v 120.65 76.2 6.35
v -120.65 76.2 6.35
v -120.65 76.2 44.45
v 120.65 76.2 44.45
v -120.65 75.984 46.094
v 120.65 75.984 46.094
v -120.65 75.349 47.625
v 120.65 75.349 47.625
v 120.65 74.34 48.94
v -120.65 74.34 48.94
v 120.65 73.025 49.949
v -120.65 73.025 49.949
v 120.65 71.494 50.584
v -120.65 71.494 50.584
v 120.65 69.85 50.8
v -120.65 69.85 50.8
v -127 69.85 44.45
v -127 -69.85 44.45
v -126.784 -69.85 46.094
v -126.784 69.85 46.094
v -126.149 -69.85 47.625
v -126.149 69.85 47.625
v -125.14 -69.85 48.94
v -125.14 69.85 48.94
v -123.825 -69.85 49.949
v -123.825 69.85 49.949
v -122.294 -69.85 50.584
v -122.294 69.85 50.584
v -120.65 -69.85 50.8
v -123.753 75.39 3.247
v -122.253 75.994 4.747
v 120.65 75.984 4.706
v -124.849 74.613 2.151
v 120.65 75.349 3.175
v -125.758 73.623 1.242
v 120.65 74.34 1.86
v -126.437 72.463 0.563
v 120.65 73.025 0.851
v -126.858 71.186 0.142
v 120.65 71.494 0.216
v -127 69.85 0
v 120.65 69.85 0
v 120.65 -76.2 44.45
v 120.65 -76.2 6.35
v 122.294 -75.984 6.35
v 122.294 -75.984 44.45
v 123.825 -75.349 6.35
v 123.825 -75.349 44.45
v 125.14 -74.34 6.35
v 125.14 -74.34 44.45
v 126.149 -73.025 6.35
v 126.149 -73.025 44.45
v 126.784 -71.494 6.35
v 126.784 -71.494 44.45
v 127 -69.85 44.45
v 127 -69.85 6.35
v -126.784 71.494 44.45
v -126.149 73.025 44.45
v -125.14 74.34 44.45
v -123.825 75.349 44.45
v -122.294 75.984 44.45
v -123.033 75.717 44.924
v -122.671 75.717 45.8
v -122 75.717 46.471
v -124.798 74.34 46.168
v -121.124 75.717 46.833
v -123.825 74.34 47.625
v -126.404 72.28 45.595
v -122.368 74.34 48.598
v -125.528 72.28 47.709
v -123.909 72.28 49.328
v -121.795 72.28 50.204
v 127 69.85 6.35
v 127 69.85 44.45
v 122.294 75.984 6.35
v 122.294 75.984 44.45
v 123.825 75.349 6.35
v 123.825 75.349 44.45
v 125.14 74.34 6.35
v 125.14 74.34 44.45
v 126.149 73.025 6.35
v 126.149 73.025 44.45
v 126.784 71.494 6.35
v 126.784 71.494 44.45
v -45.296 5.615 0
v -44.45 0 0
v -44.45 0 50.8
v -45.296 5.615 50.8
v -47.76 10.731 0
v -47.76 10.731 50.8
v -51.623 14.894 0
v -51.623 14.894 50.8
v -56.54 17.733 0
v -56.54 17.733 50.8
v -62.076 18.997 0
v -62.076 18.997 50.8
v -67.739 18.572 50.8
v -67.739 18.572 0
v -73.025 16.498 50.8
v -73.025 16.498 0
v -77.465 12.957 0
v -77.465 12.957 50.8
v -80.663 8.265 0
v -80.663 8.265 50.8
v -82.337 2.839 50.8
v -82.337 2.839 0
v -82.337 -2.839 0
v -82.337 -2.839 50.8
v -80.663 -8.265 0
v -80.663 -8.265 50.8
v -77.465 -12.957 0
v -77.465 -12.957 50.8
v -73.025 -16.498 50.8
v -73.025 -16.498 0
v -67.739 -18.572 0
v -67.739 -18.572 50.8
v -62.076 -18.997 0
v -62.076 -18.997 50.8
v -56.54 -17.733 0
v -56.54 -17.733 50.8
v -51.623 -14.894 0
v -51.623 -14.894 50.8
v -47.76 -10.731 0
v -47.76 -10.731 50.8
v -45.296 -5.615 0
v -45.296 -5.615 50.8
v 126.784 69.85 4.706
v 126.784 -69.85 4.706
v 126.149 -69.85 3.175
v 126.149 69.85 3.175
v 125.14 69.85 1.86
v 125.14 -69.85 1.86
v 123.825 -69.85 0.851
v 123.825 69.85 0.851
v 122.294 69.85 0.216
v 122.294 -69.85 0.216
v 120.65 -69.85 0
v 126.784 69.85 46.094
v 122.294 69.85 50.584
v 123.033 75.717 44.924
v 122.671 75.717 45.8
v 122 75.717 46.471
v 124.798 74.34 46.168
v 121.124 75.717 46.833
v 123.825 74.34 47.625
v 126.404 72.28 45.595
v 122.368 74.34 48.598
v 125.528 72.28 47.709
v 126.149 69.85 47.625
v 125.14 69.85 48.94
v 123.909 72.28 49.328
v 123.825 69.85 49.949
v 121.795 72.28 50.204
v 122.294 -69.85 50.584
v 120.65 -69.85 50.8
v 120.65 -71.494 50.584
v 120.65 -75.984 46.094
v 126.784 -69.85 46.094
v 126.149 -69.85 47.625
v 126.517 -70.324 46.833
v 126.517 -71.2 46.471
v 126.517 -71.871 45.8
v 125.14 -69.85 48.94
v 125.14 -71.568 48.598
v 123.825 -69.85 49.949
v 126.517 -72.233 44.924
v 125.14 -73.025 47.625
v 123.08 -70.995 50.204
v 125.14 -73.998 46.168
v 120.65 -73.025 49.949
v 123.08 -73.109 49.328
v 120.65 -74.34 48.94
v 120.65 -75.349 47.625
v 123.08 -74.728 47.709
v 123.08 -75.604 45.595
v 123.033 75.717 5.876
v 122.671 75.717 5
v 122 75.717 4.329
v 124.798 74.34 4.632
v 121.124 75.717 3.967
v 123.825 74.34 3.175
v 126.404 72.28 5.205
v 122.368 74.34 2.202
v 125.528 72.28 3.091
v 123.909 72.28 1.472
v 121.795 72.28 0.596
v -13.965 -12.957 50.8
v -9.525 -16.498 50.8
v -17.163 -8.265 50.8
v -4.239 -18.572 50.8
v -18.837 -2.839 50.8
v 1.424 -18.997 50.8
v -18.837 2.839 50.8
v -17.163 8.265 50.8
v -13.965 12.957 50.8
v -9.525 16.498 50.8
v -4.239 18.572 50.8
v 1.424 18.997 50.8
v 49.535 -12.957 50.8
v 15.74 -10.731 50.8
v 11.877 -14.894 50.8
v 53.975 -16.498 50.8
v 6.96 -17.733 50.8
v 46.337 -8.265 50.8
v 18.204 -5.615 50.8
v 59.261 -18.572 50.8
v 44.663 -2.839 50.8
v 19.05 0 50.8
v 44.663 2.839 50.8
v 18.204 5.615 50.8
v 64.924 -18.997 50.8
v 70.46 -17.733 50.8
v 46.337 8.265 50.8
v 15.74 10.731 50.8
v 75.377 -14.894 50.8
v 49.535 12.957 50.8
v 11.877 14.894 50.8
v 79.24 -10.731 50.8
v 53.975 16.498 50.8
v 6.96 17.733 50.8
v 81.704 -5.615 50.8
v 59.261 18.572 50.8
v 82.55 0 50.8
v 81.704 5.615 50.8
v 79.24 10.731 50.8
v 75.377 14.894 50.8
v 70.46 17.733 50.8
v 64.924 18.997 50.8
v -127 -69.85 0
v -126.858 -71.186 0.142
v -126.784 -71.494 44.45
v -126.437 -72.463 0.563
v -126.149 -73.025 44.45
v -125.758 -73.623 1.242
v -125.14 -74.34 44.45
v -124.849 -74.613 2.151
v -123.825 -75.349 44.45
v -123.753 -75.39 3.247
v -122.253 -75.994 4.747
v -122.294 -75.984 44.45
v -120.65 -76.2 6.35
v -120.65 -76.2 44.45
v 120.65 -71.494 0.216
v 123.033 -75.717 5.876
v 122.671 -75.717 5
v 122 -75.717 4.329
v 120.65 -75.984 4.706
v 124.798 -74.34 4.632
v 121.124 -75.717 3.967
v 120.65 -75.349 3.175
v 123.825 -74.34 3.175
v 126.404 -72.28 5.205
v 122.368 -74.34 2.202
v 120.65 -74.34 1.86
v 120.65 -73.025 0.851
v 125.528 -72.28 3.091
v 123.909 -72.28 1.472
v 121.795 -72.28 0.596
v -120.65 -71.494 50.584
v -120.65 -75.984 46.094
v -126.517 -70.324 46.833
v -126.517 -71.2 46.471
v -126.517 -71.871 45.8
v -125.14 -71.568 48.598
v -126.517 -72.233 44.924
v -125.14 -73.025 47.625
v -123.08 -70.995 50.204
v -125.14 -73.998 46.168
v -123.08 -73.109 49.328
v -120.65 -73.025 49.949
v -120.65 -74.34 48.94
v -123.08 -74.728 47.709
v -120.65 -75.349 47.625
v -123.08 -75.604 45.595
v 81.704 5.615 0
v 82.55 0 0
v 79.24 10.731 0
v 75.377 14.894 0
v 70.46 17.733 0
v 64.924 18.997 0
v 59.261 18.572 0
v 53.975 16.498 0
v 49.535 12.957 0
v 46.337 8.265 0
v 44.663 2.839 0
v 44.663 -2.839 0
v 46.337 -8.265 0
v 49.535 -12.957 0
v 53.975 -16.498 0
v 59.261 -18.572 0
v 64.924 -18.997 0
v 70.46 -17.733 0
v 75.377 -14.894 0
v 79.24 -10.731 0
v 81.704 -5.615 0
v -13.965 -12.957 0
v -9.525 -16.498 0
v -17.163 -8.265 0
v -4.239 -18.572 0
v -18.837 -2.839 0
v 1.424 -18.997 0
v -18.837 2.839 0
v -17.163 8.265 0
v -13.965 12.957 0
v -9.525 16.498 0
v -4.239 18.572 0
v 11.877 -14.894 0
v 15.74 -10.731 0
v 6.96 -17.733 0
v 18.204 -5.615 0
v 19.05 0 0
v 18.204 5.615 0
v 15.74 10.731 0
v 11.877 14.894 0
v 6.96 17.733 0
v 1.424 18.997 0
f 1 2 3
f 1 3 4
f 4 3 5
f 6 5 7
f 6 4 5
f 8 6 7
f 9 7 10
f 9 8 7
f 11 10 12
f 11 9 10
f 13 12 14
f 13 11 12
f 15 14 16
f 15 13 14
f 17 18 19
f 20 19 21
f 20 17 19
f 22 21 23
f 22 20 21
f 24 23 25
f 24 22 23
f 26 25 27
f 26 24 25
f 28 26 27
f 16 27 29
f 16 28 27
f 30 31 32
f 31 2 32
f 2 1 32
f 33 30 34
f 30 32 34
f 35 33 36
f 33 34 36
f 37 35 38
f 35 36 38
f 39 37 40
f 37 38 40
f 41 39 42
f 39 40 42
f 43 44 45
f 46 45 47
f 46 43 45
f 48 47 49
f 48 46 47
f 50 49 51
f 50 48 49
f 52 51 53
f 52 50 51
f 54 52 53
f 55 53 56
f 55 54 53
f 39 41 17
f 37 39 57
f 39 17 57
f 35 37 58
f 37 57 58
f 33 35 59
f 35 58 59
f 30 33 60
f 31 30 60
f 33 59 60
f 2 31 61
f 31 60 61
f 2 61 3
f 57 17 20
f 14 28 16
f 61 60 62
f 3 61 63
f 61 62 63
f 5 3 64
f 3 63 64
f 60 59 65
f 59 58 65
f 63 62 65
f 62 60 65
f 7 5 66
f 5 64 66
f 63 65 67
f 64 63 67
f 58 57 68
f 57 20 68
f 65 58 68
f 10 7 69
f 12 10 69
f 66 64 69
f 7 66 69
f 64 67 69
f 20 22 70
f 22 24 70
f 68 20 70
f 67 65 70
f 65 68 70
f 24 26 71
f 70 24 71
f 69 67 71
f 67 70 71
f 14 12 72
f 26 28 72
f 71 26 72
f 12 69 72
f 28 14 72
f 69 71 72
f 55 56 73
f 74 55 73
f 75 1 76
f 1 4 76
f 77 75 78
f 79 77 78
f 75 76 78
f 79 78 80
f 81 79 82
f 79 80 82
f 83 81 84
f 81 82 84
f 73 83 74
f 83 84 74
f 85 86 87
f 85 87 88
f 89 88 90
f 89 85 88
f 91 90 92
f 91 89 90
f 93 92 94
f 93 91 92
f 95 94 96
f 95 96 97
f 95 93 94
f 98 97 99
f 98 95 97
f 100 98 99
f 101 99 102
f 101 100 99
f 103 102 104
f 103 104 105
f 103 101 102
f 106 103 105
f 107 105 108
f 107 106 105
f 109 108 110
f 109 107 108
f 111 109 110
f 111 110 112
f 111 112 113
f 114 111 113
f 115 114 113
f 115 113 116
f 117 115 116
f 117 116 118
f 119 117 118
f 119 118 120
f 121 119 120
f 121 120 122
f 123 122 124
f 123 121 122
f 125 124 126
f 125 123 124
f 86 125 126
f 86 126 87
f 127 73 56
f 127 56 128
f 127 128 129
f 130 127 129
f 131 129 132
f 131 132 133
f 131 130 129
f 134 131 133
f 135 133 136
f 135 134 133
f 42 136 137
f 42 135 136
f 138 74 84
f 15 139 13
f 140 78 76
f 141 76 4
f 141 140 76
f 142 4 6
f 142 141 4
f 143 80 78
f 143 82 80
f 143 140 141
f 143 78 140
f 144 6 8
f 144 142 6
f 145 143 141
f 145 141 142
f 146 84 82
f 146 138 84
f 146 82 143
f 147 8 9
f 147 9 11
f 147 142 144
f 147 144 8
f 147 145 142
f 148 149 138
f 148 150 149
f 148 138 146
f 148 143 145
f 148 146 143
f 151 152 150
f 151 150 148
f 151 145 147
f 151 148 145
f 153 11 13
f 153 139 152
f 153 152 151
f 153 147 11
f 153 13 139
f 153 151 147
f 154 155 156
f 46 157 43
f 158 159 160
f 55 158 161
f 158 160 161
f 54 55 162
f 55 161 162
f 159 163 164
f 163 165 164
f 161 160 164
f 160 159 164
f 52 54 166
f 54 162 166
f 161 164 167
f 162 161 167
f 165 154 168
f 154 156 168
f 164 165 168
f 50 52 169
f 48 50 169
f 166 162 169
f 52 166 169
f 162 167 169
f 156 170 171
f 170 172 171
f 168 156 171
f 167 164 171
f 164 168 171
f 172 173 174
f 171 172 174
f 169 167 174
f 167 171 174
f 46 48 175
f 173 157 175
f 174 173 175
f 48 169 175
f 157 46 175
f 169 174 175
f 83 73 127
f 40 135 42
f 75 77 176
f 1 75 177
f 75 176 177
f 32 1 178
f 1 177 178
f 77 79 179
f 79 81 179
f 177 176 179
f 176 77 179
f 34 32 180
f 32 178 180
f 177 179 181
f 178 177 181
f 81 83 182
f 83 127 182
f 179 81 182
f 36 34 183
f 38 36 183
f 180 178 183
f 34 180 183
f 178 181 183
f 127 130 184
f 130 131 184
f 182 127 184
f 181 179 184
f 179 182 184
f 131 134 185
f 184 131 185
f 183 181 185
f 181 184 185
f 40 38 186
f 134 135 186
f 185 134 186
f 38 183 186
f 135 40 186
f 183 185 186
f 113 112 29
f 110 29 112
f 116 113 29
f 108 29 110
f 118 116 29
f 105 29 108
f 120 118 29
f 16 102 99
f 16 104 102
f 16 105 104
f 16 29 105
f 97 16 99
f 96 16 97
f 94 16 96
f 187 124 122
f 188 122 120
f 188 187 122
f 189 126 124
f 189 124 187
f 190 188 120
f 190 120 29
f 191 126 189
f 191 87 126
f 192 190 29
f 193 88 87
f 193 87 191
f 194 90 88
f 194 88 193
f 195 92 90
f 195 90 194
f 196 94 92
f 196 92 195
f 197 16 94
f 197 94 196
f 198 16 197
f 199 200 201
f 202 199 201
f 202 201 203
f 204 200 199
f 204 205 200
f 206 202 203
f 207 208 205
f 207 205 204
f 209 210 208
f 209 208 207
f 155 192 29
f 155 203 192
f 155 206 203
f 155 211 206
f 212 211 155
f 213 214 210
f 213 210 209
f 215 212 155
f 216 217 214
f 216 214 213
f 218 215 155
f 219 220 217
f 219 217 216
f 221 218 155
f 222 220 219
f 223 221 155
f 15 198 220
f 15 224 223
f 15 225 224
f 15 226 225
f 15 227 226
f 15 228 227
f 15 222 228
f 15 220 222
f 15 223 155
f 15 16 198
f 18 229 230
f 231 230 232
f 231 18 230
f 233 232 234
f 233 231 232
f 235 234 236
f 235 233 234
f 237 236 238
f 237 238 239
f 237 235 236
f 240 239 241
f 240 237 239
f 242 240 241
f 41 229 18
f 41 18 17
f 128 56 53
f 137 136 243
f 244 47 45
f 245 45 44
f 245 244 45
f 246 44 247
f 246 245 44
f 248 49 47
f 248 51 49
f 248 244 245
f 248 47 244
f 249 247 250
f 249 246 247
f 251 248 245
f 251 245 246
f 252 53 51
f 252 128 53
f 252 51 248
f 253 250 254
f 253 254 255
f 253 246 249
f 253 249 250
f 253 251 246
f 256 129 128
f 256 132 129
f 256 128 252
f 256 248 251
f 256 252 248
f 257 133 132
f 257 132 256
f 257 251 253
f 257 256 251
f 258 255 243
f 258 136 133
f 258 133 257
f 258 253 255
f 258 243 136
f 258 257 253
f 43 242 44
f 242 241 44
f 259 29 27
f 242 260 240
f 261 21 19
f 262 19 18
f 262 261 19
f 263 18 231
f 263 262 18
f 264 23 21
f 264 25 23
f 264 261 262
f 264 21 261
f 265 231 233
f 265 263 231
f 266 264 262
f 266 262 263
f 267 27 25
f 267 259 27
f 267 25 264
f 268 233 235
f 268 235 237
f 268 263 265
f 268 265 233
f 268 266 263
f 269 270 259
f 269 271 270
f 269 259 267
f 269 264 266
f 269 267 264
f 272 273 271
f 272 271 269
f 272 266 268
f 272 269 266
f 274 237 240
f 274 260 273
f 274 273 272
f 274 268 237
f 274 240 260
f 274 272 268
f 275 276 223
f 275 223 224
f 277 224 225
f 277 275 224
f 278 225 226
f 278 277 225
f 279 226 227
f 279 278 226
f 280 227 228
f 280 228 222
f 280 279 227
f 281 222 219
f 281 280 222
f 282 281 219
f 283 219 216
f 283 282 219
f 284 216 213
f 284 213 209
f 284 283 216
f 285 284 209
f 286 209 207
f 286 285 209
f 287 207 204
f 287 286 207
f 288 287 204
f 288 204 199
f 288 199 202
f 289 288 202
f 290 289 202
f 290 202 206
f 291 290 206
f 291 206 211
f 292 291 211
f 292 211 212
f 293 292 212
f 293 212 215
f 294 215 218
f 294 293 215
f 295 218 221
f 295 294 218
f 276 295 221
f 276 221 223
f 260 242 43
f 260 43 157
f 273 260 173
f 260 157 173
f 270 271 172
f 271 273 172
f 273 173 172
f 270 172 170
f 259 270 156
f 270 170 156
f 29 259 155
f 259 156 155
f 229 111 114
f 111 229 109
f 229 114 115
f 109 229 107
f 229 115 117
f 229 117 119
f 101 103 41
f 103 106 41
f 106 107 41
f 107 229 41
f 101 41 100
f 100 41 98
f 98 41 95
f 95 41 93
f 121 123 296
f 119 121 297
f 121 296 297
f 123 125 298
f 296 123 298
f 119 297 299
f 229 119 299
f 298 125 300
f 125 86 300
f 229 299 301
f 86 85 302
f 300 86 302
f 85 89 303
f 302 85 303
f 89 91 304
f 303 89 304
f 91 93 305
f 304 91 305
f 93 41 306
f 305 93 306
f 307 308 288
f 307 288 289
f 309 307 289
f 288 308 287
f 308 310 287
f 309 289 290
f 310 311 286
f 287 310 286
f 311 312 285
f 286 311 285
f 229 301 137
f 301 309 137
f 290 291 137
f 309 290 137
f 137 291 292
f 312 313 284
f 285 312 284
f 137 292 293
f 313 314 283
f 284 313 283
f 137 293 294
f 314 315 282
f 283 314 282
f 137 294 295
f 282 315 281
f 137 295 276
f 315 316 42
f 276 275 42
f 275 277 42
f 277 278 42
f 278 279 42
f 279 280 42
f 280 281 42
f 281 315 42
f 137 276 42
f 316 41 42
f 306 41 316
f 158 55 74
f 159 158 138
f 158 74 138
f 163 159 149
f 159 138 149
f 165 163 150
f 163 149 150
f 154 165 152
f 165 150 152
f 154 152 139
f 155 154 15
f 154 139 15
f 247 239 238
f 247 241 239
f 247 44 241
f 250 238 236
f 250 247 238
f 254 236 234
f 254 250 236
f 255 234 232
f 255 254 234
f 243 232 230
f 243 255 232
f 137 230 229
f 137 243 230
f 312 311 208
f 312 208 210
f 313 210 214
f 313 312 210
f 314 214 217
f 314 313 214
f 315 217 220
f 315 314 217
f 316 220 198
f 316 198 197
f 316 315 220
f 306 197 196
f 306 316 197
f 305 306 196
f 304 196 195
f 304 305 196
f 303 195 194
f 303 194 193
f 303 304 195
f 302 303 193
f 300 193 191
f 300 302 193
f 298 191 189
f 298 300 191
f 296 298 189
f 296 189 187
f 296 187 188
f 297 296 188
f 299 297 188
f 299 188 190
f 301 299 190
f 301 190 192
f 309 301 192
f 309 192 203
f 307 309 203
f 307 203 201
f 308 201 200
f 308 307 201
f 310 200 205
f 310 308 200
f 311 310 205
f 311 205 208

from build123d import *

# Parameters (mm, degrees)
F0_W     = 254
F0_H     = 152.4
F0_R     = 19.05
F1_DEPTH = 50.8
F2_R     = 6.35


with BuildPart() as f1:
    # F0 (on Top) → F1 (new body)
    with BuildSketch(Plane.XY):
        Rectangle(F0_W, F0_H)
        with Locations((-63.5, 0)):
            Circle(F0_R, mode=Mode.SUBTRACT)
        Circle(F0_R, mode=Mode.SUBTRACT)
        with Locations((63.5, 0)):
            Circle(F0_R, mode=Mode.SUBTRACT)
    extrude(amount=F1_DEPTH)

    # F2
    f2_edges = [f1.edges().sort_by_distance(p)[0] for p in [
        (0, -76.2, 50.8),
        (-127, 0, 50.8),
        (127, 0, 0),
        (127, 0, 50.8),
        (-127, -76.2, 25.4),
        (127, -76.2, 25.4),
        (0, -76.2, 0),
        (127, 76.2, 25.4),
        (-127, 76.2, 25.4),
        (0, 76.2, 0),
        (0, 76.2, 50.8),
    ]]
    fillet(f2_edges, radius=F2_R)


solid = f1.part
